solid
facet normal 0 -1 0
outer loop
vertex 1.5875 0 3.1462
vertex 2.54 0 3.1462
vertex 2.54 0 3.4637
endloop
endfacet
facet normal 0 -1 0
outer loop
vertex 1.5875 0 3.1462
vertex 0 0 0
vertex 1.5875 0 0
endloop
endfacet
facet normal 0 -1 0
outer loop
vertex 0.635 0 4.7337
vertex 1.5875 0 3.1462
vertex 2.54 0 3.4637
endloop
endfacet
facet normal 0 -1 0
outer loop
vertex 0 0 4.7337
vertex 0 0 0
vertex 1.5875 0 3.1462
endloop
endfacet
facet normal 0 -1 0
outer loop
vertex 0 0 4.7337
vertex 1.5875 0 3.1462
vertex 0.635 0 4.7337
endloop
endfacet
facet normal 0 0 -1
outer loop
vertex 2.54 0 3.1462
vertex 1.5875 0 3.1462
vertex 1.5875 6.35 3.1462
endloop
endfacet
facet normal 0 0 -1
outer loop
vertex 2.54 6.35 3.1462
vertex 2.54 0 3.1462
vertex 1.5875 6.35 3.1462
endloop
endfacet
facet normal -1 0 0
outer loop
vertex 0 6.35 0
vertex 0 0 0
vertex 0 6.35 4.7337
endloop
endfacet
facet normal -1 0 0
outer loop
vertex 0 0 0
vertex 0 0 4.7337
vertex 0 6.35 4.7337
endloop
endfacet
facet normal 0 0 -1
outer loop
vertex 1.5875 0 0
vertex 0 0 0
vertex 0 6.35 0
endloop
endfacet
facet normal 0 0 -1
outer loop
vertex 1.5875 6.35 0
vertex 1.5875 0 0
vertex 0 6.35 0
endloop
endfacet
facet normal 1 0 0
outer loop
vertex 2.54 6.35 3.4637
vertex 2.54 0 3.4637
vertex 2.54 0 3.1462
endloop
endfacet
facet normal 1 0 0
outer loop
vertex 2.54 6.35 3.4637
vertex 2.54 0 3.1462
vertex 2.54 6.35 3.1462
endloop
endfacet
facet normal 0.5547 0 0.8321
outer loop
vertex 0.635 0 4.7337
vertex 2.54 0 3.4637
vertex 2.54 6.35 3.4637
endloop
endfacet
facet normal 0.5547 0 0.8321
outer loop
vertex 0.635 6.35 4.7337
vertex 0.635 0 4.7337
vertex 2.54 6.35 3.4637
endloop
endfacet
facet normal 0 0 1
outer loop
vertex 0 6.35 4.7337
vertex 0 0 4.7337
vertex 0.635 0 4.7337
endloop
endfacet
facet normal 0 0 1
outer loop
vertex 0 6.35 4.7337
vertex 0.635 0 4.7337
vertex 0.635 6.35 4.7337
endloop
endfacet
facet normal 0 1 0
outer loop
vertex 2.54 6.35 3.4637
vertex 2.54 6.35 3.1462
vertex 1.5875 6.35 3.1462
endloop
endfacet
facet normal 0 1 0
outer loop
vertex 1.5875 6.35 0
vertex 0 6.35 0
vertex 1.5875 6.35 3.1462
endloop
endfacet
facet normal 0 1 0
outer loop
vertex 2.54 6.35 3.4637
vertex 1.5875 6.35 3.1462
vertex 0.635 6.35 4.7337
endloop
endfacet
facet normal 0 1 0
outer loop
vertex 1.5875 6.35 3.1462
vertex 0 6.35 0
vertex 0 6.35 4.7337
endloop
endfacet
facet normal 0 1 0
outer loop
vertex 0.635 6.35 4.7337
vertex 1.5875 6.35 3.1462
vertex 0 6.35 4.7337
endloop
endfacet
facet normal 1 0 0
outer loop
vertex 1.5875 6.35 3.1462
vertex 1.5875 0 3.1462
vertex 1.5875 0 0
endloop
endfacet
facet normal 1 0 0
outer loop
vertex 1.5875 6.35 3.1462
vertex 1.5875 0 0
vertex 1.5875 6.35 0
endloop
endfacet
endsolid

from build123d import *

# Parameters (mm, degrees)
F0_W     = 6.35
F0_H     = 3.175
F1_DEPTH = 1.5875
F2_W     = 6.35
F2_H     = 1.5875
F3_DEPTH = 2.54
F4_SIZE2 = 1.27
F4_SIZE  = 1.905


with BuildPart() as f1:
    # F0 (on Right) → F1 (new body)
    with BuildSketch(Plane.YZ):
        with Locations((3.175, 1.5875)):
            Rectangle(F0_W, F0_H)
    extrude(amount=F1_DEPTH)

    # F2 (on Right) → F3 (join)
    with BuildSketch(Plane.YZ):
        with Locations((3.175, 3.9399821234)):
            Rectangle(F2_W, F2_H)
    extrude(amount=F3_DEPTH)

    # F4
    f4_edges = [f1.edges().sort_by_distance(p)[0] for p in [
        (2.54, 3.175, 4.733732),
    ]]
    f4_side = f1.faces().sort_by_distance((1.27, 3.175, 4.733732))[0]
    chamfer(f4_edges, length=F4_SIZE, length2=F4_SIZE2, reference=f4_side)


solid = f1.part
